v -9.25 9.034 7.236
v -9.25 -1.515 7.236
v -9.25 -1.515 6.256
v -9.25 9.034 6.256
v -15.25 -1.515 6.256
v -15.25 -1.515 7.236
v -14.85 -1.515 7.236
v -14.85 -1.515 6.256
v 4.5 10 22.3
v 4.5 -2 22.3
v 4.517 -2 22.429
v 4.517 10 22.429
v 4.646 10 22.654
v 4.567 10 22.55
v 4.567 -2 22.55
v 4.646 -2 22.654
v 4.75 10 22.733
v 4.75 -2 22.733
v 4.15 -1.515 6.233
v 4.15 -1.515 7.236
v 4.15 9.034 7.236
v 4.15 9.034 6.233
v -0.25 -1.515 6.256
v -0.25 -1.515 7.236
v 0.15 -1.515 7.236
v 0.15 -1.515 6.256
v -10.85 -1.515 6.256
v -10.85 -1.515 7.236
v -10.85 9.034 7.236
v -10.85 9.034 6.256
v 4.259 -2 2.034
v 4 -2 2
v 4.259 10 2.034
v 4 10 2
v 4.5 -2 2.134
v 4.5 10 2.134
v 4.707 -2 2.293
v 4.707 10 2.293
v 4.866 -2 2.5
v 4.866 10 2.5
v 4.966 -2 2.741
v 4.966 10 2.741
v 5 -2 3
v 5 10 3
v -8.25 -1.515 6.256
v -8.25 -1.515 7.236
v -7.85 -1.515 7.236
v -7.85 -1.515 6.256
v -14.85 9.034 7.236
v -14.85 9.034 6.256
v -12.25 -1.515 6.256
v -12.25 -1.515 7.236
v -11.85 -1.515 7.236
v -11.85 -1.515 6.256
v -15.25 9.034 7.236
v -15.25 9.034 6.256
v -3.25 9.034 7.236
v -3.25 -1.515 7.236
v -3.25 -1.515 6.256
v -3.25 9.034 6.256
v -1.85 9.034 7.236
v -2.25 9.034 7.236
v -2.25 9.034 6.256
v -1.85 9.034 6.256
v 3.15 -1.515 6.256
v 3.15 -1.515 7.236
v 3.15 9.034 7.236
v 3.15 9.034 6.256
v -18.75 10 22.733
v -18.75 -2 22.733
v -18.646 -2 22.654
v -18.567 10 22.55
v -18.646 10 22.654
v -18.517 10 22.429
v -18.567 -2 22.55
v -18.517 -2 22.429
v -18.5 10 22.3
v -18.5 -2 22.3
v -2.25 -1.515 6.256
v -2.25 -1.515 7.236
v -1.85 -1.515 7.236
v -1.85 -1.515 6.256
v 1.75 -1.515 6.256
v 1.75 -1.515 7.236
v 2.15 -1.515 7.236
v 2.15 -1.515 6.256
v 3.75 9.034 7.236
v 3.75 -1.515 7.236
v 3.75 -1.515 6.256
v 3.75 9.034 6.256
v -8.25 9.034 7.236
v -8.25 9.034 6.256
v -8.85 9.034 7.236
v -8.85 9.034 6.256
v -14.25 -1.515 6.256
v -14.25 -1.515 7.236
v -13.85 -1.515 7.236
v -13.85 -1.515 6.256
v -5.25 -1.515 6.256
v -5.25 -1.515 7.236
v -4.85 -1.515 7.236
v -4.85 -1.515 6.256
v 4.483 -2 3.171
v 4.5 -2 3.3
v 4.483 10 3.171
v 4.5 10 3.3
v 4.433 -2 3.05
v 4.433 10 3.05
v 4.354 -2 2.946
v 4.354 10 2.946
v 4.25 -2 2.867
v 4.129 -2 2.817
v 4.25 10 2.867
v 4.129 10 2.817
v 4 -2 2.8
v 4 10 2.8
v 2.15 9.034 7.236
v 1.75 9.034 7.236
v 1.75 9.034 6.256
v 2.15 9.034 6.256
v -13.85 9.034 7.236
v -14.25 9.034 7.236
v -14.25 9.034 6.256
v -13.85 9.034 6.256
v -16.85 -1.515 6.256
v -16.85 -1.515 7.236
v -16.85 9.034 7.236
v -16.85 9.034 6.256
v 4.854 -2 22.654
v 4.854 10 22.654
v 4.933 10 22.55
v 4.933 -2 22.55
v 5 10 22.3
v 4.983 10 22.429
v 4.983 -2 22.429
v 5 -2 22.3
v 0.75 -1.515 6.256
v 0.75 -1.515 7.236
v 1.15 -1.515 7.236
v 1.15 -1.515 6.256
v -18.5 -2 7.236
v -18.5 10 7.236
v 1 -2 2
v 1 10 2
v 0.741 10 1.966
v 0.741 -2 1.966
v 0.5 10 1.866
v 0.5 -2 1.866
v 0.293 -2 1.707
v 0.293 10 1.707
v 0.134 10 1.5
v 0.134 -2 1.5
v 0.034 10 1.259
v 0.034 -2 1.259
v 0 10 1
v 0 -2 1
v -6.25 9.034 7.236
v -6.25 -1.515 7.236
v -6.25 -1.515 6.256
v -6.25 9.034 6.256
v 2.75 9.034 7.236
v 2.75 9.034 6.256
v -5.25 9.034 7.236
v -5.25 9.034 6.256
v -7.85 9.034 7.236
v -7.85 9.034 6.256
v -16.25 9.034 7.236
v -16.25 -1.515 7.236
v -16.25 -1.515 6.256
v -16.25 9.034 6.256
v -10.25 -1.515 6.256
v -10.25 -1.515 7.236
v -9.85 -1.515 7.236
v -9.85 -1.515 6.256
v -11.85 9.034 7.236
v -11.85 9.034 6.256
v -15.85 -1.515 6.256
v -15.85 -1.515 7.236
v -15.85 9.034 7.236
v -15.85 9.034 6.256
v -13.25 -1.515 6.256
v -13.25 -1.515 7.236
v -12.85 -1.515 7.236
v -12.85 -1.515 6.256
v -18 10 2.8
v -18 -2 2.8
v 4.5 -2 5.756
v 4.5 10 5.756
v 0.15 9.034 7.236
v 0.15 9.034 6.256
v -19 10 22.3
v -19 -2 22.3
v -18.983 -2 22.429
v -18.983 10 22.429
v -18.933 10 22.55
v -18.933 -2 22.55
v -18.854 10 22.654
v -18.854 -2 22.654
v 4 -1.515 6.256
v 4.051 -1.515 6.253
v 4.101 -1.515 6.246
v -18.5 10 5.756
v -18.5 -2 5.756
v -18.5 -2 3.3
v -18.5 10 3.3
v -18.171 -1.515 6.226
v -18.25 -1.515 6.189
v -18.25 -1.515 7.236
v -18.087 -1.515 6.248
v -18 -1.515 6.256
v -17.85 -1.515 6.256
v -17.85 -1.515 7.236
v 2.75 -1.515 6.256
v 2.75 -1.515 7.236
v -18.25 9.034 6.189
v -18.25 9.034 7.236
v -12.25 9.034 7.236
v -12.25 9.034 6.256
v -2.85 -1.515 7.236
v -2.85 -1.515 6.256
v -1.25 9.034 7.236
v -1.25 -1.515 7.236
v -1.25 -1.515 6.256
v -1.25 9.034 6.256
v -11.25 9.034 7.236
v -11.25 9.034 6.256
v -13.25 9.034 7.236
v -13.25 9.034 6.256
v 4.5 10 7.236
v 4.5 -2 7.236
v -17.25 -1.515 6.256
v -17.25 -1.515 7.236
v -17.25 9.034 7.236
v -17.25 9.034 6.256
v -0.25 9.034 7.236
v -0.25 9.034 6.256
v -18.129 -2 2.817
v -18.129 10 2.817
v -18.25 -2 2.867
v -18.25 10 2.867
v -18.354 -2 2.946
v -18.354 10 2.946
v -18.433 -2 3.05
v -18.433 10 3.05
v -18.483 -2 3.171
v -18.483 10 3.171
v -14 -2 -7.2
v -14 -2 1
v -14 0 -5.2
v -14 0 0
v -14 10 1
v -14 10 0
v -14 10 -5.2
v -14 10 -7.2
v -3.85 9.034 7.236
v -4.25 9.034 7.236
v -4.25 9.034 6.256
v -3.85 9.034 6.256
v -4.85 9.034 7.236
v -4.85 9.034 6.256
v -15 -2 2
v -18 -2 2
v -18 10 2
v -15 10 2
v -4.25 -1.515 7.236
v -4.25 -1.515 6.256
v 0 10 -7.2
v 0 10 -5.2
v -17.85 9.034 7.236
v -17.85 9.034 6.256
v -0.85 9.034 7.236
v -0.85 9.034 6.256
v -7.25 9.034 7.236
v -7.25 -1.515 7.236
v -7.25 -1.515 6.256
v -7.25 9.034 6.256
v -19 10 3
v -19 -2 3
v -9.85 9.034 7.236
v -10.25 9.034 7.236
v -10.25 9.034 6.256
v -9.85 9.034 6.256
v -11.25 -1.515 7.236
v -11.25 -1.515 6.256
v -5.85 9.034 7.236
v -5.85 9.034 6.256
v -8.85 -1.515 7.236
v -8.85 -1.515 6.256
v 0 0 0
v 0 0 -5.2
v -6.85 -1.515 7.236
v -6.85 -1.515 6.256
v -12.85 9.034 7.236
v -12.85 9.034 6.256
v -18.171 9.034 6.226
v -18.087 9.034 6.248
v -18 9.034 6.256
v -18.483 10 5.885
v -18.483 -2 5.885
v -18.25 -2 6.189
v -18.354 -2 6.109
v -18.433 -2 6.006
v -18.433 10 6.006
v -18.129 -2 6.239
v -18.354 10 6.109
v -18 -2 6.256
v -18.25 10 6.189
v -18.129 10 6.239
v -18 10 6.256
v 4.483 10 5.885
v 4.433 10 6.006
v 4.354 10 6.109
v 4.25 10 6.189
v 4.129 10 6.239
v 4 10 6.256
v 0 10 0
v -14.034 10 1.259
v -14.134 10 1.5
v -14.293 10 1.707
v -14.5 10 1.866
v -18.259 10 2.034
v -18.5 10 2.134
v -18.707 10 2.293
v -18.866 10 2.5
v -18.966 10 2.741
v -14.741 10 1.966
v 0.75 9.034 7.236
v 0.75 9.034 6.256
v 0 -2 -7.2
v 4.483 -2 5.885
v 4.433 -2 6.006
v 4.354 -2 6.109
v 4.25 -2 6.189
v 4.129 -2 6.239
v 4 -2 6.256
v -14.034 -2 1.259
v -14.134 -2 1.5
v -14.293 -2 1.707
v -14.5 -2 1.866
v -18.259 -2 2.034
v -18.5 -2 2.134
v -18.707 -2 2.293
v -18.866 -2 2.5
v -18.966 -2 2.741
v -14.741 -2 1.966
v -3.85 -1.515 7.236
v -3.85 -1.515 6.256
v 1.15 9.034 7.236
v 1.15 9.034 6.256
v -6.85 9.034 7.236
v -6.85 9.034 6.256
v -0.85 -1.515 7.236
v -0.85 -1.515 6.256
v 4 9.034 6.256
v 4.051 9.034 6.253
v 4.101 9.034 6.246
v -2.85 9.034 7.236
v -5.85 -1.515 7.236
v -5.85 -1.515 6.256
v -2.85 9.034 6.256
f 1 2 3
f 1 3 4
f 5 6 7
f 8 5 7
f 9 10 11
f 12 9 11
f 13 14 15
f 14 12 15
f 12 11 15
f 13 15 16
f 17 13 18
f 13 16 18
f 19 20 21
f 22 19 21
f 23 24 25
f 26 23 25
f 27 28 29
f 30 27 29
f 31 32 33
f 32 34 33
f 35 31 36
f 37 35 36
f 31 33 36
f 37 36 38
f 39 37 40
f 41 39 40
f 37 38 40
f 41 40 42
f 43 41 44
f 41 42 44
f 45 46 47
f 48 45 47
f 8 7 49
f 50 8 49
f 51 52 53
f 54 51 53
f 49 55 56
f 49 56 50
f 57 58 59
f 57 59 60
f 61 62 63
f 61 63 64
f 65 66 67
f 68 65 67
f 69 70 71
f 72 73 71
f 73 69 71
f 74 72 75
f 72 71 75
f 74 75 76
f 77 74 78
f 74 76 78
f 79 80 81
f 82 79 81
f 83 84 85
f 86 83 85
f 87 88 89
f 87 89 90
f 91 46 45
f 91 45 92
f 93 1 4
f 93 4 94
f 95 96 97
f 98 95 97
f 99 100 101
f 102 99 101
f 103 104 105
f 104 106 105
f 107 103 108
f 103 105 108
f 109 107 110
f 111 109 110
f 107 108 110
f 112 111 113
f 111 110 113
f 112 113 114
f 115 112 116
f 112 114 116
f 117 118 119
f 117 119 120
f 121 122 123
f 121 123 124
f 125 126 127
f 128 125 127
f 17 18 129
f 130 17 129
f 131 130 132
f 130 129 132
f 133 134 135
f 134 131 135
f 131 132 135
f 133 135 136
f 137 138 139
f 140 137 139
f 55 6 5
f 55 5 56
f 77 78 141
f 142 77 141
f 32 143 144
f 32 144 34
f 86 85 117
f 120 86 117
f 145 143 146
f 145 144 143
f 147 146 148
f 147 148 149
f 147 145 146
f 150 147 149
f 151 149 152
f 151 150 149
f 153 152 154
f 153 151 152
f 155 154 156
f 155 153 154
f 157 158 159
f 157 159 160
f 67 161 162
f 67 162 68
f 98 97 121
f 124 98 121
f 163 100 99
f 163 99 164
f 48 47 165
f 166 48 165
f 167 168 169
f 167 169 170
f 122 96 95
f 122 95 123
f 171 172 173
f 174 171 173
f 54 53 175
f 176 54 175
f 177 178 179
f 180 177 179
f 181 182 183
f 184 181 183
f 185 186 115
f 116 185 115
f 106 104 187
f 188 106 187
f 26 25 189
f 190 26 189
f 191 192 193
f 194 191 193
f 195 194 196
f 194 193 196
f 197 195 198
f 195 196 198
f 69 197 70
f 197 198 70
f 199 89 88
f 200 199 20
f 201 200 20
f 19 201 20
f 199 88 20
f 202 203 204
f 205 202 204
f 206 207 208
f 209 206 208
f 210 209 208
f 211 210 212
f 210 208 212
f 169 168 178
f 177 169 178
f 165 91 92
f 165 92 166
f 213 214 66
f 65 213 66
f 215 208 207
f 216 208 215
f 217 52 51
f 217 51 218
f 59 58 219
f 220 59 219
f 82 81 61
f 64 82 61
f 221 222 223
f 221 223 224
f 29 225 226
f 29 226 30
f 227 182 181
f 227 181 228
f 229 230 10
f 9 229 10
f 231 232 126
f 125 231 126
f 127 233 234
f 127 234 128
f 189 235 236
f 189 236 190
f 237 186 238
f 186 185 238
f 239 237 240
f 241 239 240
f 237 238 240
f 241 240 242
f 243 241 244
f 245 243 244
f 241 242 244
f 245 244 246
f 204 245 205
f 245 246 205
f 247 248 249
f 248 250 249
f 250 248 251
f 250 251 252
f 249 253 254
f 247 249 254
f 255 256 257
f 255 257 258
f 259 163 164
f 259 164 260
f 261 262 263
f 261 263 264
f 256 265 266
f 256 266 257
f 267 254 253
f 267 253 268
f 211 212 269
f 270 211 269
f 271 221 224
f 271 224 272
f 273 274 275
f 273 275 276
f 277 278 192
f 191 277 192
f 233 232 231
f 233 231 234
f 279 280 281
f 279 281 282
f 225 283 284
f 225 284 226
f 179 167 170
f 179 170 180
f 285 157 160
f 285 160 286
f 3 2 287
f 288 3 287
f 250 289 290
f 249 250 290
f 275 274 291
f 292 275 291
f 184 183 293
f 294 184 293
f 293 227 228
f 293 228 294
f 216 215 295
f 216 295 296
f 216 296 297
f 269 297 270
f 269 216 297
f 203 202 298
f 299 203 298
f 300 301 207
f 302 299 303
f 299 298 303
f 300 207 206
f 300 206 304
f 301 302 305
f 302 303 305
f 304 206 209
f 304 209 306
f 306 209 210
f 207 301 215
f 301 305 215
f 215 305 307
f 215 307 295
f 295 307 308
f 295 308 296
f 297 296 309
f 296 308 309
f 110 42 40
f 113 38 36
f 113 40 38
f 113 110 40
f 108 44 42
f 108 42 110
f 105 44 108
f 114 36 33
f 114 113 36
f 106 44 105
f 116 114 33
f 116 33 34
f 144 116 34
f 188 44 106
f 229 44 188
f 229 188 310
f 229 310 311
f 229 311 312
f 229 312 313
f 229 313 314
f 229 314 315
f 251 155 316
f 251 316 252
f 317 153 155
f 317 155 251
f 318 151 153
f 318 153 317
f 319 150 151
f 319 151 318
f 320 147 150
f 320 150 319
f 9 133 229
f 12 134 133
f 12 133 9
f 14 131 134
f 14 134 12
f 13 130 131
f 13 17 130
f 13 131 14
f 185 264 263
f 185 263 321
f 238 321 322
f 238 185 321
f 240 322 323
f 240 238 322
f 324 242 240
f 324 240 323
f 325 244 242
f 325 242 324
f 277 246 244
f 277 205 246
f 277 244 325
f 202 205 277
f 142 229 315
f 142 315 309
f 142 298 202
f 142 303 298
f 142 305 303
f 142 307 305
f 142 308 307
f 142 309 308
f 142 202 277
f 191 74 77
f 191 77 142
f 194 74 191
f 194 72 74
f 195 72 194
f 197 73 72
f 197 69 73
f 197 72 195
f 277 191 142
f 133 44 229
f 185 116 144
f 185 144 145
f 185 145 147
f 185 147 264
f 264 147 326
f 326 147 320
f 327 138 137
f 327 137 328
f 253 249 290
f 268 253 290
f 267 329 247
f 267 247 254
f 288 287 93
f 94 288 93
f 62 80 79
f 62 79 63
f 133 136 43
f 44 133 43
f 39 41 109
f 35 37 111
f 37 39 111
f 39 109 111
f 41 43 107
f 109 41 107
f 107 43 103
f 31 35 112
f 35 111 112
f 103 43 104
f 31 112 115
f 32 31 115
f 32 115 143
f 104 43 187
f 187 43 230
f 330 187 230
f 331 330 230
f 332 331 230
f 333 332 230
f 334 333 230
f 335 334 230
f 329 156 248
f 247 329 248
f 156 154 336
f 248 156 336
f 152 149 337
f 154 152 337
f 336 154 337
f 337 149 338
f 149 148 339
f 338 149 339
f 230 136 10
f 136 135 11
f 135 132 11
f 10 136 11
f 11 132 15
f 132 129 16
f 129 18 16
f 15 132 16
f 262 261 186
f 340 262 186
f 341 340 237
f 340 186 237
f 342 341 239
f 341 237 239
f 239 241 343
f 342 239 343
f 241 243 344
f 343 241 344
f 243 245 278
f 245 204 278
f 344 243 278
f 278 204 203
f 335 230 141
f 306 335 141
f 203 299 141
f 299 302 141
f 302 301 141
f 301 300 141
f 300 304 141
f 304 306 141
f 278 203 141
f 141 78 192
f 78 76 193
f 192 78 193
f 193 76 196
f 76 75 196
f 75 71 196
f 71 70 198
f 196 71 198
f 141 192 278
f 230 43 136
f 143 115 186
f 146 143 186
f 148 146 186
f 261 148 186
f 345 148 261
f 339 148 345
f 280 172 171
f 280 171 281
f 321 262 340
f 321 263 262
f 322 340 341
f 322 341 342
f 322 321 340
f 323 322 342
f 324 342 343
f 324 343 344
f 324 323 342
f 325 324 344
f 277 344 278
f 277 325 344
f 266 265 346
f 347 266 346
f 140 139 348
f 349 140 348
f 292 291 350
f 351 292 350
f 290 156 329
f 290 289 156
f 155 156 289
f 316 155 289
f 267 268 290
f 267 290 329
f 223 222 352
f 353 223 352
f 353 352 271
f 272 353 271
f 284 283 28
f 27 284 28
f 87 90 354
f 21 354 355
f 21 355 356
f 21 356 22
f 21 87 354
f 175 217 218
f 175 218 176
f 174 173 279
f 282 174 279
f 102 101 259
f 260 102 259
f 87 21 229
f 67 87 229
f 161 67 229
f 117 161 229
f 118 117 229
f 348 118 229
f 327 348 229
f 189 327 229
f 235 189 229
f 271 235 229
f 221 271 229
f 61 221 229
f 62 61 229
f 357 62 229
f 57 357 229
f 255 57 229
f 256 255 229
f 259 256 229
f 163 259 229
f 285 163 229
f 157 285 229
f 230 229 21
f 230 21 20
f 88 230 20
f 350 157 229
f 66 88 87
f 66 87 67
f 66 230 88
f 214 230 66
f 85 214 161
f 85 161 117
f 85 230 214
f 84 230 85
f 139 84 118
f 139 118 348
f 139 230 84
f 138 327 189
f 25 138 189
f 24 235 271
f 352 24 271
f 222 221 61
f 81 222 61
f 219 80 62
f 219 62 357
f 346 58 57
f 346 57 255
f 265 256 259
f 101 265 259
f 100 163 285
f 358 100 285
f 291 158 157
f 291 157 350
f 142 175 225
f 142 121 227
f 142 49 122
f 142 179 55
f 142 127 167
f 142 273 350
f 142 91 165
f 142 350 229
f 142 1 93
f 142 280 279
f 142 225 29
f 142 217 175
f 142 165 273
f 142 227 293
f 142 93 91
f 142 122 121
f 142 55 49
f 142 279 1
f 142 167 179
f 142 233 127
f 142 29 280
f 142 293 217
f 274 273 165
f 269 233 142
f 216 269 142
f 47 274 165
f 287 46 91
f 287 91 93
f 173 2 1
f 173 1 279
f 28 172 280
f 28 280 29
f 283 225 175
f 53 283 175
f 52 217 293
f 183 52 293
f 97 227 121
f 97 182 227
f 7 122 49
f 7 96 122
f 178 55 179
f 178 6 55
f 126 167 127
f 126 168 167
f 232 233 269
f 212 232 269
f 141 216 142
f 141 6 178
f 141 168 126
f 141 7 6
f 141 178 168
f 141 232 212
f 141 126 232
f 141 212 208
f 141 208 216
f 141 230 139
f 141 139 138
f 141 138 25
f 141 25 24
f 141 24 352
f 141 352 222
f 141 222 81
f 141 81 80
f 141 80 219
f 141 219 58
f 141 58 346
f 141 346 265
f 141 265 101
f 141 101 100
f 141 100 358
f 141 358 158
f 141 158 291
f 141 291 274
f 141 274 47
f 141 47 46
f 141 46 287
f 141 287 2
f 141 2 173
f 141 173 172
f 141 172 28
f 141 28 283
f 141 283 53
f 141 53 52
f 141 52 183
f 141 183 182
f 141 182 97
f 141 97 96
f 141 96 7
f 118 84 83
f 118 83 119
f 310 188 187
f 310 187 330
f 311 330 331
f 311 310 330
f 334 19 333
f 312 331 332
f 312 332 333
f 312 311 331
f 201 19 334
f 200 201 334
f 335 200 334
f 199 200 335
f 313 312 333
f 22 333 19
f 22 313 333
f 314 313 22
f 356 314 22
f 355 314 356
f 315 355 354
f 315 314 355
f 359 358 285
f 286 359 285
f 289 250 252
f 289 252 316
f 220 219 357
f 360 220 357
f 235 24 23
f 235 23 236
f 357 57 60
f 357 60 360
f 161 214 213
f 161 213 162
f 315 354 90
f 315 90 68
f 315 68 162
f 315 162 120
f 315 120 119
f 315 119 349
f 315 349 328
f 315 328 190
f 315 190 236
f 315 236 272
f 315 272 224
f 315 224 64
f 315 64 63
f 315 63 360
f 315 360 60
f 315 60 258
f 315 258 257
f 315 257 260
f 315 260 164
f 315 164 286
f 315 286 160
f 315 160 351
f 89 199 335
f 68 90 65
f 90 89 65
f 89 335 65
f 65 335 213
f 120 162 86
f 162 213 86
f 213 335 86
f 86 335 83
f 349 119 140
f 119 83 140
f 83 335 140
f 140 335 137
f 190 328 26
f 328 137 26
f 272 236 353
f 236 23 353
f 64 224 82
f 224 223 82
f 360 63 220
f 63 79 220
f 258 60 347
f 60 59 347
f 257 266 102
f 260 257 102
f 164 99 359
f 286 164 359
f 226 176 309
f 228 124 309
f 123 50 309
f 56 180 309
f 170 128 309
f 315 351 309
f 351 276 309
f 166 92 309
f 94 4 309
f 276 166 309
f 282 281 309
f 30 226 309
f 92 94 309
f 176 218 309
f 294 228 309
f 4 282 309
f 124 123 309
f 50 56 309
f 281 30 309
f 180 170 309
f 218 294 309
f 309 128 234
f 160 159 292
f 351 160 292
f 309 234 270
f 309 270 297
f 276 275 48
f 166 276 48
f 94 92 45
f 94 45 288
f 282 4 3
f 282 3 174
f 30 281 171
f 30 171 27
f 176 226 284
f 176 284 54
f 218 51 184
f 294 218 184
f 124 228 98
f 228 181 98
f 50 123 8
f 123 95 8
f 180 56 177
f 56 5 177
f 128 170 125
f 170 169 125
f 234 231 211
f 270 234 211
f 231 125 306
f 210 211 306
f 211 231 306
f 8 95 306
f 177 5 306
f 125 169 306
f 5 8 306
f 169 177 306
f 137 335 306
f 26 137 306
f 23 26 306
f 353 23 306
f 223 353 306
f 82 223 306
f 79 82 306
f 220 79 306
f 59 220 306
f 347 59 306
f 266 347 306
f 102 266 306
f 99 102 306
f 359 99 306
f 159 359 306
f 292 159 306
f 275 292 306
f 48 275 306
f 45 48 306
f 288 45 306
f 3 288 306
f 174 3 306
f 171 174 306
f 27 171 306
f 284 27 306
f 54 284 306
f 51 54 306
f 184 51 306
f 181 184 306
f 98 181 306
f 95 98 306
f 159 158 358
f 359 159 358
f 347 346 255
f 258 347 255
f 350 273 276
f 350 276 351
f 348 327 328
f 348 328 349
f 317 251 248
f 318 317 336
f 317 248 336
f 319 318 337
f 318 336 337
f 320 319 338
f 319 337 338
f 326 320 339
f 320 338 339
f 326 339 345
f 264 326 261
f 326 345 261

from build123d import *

# Parameters (mm, degrees)
ESQUISSE3_W             = 14
ESQUISSE3_H             = 2
BOSS_EXTRU_1_DEPTH      = 10
BOSS_EXTRU_1_2_DEPTH    = 10
ESQUISSE4_W             = 9.2
ESQUISSE4_H             = 2
BOSS_EXTRU_2_DEPTH      = 14
BOSS_EXTRU_3_DEPTH      = 12
CONG_2_R                = 0.5
CONG_4_R                = 1
CONG_5_R                = 1
CONG_6_R                = 1
ESQUISSE6_W             = 23
ESQUISSE6_H             = 0.979911891
BOSS_EXTRU_4_DEPTH      = 12
CONG_8_R                = 0.5
ESQUISSE7_W             = 0.4
ESQUISSE7_H             = 10.548698827
ENL_V_MAT_EXTRU_1_DEPTH = 1.5


with BuildPart() as part:
    # Esquisse3 → Boss.-Extru.1 (new body)
    with BuildSketch(Plane(origin=(0, 0, 0), x_dir=(1, 0, 0), z_dir=(0, 1, 0))):
        with Locations((-7, 6.2)):
            Rectangle(ESQUISSE3_W, ESQUISSE3_H)
    extrude(amount=BOSS_EXTRU_1_DEPTH)



with BuildPart() as body_2:
    # Esquisse3 → Boss.-Extru.1 2 (new body)
    with BuildSketch(Plane(origin=(0, 0, 0), x_dir=(1, 0, 0), z_dir=(0, 1, 0))):
        with Locations((-7, -1)):
            Rectangle(ESQUISSE3_W, ESQUISSE3_H)
    extrude(amount=BOSS_EXTRU_1_2_DEPTH)


with BuildPart() as part_1:
    add(part.part)

    add(body_2.part)  # Boss.-Extru.2 merges body 2
    # Esquisse4 → Boss.-Extru.2 (add)
    with BuildSketch(Plane(origin=(0, 0, 0), x_dir=(0, 0, -1), z_dir=(1, 0, 0))):
        with Locations((2.6, -1)):
            Rectangle(ESQUISSE4_W, ESQUISSE4_H)
    extrude(amount=-BOSS_EXTRU_2_DEPTH)

    # Esquisse5 → Boss.-Extru.3 (add)
    with BuildSketch(Plane.XZ.offset(2)):
        Polygon((-14, 2), (-19, 2), (-19, 22.8), (-18.5, 22.8), (-18.5, 2.8), (4.5, 2.8), (4.5, 22.8), (5, 22.8), (5, 2), (0, 2), align=None)
    extrude(amount=-BOSS_EXTRU_3_DEPTH)

    # Congé2
    # the kernel refuses this fillet: 0.5 mm, written as the material it takes off along each edge
    with BuildSketch(Plane(origin=(-19, -3.25, 22.8), x_dir=(0, 0, -1), z_dir=(0, 1, 0)), Plane(origin=(-18.5, -3.25, 22.8), x_dir=(-1, 0, 0), z_dir=(0, 1, 0)), Plane(origin=(4.5, -3.25, 22.8), x_dir=(0, 0, -1), z_dir=(0, 1, 0)), Plane(origin=(5, -3.25, 22.8), x_dir=(-1, 0, 0), z_dir=(0, 1, 0))) as cong_2_piece_1:
        with BuildLine():
            CenterArc((CONG_2_R, -CONG_2_R), CONG_2_R, 90, 90)
            Line((0, -CONG_2_R), (0, 0))
            Line((0, 0), (CONG_2_R, 0))
        make_face()
    extrude(amount=14.5, mode=Mode.SUBTRACT)

    # Congé4
    cong_4_edges = [part_1.edges().sort_by_distance(p)[0] for p in [
        (-19, 4, 2),
    ]]
    fillet(cong_4_edges, radius=CONG_4_R)

    # Congé5
    cong_5_edges = [part_1.edges().sort_by_distance(p)[0] for p in [
        (5, 4, 2),
    ]]
    fillet(cong_5_edges, radius=CONG_5_R)

    # Congé6
    cong_6_edges = [part_1.edges().sort_by_distance(p)[0] for p in [
        (-14, 4, 2),
        (0, 4, 2),
    ]]
    fillet(cong_6_edges, radius=CONG_6_R)

    # Esquisse6 → Boss.-Extru.4 (add)
    with BuildSketch(Plane(origin=(0, -2, 0), x_dir=(-1, 0, 0), z_dir=(0, -1, 0))):
        with Locations((7, -6.745764799)):
            Rectangle(ESQUISSE6_W, ESQUISSE6_H)
    extrude(amount=-BOSS_EXTRU_4_DEPTH)

    # Congé8
    cong_8_edges = [part_1.edges().sort_by_distance(p)[0] for p in [
        (-18.5, 4, 6.255808853),
        (4.5, 4, 6.255808853),
        (-18.5, 4, 2.8),
        (4.5, 4, 2.8),
    ]]
    fillet(cong_8_edges, radius=CONG_8_R)

    # Esquisse7 → Enlèv. mat.-Extru.1 (cut)
    with BuildSketch(Plane.XY.offset(7.235720744)):
        with Locations((-18.05, 3.759681921)):
            Rectangle(ESQUISSE7_W, ESQUISSE7_H)
        with Locations((-17.05, 3.759681921)):
            Rectangle(ESQUISSE7_W, ESQUISSE7_H)
        with Locations((-16.05, 3.759681921)):
            Rectangle(ESQUISSE7_W, ESQUISSE7_H)
        with Locations((-15.05, 3.759681921)):
            Rectangle(ESQUISSE7_W, ESQUISSE7_H)
        with Locations((-14.05, 3.759681921)):
            Rectangle(ESQUISSE7_W, ESQUISSE7_H)
        with Locations((-13.05, 3.759681921)):
            Rectangle(ESQUISSE7_W, ESQUISSE7_H)
        with Locations((-12.05, 3.759681921)):
            Rectangle(ESQUISSE7_W, ESQUISSE7_H)
        with Locations((-11.05, 3.759681921)):
            Rectangle(ESQUISSE7_W, ESQUISSE7_H)
        with Locations((-10.05, 3.759681921)):
            Rectangle(ESQUISSE7_W, ESQUISSE7_H)
        with Locations((-9.05, 3.759681921)):
            Rectangle(ESQUISSE7_W, ESQUISSE7_H)
        with Locations((-8.05, 3.759681921)):
            Rectangle(ESQUISSE7_W, ESQUISSE7_H)
        with Locations((-7.05, 3.759681921)):
            Rectangle(ESQUISSE7_W, ESQUISSE7_H)
        with Locations((-6.05, 3.759681921)):
            Rectangle(ESQUISSE7_W, ESQUISSE7_H)
        with Locations((-5.05, 3.759681921)):
            Rectangle(ESQUISSE7_W, ESQUISSE7_H)
        with Locations((-4.05, 3.759681921)):
            Rectangle(ESQUISSE7_W, ESQUISSE7_H)
        with Locations((-3.05, 3.759681921)):
            Rectangle(ESQUISSE7_W, ESQUISSE7_H)
        with Locations((-2.05, 3.759681921)):
            Rectangle(ESQUISSE7_W, ESQUISSE7_H)
        with Locations((-1.05, 3.759681921)):
            Rectangle(ESQUISSE7_W, ESQUISSE7_H)
        with Locations((-0.05, 3.759681921)):
            Rectangle(ESQUISSE7_W, ESQUISSE7_H)
        with Locations((0.95, 3.759681921)):
            Rectangle(ESQUISSE7_W, ESQUISSE7_H)
        with Locations((1.95, 3.759681921)):
            Rectangle(ESQUISSE7_W, ESQUISSE7_H)
        with Locations((2.95, 3.759681921)):
            Rectangle(ESQUISSE7_W, ESQUISSE7_H)
        with Locations((3.95, 3.759681921)):
            Rectangle(ESQUISSE7_W, ESQUISSE7_H)
    extrude(amount=-ENL_V_MAT_EXTRU_1_DEPTH, mode=Mode.SUBTRACT)


solid = part_1.part
